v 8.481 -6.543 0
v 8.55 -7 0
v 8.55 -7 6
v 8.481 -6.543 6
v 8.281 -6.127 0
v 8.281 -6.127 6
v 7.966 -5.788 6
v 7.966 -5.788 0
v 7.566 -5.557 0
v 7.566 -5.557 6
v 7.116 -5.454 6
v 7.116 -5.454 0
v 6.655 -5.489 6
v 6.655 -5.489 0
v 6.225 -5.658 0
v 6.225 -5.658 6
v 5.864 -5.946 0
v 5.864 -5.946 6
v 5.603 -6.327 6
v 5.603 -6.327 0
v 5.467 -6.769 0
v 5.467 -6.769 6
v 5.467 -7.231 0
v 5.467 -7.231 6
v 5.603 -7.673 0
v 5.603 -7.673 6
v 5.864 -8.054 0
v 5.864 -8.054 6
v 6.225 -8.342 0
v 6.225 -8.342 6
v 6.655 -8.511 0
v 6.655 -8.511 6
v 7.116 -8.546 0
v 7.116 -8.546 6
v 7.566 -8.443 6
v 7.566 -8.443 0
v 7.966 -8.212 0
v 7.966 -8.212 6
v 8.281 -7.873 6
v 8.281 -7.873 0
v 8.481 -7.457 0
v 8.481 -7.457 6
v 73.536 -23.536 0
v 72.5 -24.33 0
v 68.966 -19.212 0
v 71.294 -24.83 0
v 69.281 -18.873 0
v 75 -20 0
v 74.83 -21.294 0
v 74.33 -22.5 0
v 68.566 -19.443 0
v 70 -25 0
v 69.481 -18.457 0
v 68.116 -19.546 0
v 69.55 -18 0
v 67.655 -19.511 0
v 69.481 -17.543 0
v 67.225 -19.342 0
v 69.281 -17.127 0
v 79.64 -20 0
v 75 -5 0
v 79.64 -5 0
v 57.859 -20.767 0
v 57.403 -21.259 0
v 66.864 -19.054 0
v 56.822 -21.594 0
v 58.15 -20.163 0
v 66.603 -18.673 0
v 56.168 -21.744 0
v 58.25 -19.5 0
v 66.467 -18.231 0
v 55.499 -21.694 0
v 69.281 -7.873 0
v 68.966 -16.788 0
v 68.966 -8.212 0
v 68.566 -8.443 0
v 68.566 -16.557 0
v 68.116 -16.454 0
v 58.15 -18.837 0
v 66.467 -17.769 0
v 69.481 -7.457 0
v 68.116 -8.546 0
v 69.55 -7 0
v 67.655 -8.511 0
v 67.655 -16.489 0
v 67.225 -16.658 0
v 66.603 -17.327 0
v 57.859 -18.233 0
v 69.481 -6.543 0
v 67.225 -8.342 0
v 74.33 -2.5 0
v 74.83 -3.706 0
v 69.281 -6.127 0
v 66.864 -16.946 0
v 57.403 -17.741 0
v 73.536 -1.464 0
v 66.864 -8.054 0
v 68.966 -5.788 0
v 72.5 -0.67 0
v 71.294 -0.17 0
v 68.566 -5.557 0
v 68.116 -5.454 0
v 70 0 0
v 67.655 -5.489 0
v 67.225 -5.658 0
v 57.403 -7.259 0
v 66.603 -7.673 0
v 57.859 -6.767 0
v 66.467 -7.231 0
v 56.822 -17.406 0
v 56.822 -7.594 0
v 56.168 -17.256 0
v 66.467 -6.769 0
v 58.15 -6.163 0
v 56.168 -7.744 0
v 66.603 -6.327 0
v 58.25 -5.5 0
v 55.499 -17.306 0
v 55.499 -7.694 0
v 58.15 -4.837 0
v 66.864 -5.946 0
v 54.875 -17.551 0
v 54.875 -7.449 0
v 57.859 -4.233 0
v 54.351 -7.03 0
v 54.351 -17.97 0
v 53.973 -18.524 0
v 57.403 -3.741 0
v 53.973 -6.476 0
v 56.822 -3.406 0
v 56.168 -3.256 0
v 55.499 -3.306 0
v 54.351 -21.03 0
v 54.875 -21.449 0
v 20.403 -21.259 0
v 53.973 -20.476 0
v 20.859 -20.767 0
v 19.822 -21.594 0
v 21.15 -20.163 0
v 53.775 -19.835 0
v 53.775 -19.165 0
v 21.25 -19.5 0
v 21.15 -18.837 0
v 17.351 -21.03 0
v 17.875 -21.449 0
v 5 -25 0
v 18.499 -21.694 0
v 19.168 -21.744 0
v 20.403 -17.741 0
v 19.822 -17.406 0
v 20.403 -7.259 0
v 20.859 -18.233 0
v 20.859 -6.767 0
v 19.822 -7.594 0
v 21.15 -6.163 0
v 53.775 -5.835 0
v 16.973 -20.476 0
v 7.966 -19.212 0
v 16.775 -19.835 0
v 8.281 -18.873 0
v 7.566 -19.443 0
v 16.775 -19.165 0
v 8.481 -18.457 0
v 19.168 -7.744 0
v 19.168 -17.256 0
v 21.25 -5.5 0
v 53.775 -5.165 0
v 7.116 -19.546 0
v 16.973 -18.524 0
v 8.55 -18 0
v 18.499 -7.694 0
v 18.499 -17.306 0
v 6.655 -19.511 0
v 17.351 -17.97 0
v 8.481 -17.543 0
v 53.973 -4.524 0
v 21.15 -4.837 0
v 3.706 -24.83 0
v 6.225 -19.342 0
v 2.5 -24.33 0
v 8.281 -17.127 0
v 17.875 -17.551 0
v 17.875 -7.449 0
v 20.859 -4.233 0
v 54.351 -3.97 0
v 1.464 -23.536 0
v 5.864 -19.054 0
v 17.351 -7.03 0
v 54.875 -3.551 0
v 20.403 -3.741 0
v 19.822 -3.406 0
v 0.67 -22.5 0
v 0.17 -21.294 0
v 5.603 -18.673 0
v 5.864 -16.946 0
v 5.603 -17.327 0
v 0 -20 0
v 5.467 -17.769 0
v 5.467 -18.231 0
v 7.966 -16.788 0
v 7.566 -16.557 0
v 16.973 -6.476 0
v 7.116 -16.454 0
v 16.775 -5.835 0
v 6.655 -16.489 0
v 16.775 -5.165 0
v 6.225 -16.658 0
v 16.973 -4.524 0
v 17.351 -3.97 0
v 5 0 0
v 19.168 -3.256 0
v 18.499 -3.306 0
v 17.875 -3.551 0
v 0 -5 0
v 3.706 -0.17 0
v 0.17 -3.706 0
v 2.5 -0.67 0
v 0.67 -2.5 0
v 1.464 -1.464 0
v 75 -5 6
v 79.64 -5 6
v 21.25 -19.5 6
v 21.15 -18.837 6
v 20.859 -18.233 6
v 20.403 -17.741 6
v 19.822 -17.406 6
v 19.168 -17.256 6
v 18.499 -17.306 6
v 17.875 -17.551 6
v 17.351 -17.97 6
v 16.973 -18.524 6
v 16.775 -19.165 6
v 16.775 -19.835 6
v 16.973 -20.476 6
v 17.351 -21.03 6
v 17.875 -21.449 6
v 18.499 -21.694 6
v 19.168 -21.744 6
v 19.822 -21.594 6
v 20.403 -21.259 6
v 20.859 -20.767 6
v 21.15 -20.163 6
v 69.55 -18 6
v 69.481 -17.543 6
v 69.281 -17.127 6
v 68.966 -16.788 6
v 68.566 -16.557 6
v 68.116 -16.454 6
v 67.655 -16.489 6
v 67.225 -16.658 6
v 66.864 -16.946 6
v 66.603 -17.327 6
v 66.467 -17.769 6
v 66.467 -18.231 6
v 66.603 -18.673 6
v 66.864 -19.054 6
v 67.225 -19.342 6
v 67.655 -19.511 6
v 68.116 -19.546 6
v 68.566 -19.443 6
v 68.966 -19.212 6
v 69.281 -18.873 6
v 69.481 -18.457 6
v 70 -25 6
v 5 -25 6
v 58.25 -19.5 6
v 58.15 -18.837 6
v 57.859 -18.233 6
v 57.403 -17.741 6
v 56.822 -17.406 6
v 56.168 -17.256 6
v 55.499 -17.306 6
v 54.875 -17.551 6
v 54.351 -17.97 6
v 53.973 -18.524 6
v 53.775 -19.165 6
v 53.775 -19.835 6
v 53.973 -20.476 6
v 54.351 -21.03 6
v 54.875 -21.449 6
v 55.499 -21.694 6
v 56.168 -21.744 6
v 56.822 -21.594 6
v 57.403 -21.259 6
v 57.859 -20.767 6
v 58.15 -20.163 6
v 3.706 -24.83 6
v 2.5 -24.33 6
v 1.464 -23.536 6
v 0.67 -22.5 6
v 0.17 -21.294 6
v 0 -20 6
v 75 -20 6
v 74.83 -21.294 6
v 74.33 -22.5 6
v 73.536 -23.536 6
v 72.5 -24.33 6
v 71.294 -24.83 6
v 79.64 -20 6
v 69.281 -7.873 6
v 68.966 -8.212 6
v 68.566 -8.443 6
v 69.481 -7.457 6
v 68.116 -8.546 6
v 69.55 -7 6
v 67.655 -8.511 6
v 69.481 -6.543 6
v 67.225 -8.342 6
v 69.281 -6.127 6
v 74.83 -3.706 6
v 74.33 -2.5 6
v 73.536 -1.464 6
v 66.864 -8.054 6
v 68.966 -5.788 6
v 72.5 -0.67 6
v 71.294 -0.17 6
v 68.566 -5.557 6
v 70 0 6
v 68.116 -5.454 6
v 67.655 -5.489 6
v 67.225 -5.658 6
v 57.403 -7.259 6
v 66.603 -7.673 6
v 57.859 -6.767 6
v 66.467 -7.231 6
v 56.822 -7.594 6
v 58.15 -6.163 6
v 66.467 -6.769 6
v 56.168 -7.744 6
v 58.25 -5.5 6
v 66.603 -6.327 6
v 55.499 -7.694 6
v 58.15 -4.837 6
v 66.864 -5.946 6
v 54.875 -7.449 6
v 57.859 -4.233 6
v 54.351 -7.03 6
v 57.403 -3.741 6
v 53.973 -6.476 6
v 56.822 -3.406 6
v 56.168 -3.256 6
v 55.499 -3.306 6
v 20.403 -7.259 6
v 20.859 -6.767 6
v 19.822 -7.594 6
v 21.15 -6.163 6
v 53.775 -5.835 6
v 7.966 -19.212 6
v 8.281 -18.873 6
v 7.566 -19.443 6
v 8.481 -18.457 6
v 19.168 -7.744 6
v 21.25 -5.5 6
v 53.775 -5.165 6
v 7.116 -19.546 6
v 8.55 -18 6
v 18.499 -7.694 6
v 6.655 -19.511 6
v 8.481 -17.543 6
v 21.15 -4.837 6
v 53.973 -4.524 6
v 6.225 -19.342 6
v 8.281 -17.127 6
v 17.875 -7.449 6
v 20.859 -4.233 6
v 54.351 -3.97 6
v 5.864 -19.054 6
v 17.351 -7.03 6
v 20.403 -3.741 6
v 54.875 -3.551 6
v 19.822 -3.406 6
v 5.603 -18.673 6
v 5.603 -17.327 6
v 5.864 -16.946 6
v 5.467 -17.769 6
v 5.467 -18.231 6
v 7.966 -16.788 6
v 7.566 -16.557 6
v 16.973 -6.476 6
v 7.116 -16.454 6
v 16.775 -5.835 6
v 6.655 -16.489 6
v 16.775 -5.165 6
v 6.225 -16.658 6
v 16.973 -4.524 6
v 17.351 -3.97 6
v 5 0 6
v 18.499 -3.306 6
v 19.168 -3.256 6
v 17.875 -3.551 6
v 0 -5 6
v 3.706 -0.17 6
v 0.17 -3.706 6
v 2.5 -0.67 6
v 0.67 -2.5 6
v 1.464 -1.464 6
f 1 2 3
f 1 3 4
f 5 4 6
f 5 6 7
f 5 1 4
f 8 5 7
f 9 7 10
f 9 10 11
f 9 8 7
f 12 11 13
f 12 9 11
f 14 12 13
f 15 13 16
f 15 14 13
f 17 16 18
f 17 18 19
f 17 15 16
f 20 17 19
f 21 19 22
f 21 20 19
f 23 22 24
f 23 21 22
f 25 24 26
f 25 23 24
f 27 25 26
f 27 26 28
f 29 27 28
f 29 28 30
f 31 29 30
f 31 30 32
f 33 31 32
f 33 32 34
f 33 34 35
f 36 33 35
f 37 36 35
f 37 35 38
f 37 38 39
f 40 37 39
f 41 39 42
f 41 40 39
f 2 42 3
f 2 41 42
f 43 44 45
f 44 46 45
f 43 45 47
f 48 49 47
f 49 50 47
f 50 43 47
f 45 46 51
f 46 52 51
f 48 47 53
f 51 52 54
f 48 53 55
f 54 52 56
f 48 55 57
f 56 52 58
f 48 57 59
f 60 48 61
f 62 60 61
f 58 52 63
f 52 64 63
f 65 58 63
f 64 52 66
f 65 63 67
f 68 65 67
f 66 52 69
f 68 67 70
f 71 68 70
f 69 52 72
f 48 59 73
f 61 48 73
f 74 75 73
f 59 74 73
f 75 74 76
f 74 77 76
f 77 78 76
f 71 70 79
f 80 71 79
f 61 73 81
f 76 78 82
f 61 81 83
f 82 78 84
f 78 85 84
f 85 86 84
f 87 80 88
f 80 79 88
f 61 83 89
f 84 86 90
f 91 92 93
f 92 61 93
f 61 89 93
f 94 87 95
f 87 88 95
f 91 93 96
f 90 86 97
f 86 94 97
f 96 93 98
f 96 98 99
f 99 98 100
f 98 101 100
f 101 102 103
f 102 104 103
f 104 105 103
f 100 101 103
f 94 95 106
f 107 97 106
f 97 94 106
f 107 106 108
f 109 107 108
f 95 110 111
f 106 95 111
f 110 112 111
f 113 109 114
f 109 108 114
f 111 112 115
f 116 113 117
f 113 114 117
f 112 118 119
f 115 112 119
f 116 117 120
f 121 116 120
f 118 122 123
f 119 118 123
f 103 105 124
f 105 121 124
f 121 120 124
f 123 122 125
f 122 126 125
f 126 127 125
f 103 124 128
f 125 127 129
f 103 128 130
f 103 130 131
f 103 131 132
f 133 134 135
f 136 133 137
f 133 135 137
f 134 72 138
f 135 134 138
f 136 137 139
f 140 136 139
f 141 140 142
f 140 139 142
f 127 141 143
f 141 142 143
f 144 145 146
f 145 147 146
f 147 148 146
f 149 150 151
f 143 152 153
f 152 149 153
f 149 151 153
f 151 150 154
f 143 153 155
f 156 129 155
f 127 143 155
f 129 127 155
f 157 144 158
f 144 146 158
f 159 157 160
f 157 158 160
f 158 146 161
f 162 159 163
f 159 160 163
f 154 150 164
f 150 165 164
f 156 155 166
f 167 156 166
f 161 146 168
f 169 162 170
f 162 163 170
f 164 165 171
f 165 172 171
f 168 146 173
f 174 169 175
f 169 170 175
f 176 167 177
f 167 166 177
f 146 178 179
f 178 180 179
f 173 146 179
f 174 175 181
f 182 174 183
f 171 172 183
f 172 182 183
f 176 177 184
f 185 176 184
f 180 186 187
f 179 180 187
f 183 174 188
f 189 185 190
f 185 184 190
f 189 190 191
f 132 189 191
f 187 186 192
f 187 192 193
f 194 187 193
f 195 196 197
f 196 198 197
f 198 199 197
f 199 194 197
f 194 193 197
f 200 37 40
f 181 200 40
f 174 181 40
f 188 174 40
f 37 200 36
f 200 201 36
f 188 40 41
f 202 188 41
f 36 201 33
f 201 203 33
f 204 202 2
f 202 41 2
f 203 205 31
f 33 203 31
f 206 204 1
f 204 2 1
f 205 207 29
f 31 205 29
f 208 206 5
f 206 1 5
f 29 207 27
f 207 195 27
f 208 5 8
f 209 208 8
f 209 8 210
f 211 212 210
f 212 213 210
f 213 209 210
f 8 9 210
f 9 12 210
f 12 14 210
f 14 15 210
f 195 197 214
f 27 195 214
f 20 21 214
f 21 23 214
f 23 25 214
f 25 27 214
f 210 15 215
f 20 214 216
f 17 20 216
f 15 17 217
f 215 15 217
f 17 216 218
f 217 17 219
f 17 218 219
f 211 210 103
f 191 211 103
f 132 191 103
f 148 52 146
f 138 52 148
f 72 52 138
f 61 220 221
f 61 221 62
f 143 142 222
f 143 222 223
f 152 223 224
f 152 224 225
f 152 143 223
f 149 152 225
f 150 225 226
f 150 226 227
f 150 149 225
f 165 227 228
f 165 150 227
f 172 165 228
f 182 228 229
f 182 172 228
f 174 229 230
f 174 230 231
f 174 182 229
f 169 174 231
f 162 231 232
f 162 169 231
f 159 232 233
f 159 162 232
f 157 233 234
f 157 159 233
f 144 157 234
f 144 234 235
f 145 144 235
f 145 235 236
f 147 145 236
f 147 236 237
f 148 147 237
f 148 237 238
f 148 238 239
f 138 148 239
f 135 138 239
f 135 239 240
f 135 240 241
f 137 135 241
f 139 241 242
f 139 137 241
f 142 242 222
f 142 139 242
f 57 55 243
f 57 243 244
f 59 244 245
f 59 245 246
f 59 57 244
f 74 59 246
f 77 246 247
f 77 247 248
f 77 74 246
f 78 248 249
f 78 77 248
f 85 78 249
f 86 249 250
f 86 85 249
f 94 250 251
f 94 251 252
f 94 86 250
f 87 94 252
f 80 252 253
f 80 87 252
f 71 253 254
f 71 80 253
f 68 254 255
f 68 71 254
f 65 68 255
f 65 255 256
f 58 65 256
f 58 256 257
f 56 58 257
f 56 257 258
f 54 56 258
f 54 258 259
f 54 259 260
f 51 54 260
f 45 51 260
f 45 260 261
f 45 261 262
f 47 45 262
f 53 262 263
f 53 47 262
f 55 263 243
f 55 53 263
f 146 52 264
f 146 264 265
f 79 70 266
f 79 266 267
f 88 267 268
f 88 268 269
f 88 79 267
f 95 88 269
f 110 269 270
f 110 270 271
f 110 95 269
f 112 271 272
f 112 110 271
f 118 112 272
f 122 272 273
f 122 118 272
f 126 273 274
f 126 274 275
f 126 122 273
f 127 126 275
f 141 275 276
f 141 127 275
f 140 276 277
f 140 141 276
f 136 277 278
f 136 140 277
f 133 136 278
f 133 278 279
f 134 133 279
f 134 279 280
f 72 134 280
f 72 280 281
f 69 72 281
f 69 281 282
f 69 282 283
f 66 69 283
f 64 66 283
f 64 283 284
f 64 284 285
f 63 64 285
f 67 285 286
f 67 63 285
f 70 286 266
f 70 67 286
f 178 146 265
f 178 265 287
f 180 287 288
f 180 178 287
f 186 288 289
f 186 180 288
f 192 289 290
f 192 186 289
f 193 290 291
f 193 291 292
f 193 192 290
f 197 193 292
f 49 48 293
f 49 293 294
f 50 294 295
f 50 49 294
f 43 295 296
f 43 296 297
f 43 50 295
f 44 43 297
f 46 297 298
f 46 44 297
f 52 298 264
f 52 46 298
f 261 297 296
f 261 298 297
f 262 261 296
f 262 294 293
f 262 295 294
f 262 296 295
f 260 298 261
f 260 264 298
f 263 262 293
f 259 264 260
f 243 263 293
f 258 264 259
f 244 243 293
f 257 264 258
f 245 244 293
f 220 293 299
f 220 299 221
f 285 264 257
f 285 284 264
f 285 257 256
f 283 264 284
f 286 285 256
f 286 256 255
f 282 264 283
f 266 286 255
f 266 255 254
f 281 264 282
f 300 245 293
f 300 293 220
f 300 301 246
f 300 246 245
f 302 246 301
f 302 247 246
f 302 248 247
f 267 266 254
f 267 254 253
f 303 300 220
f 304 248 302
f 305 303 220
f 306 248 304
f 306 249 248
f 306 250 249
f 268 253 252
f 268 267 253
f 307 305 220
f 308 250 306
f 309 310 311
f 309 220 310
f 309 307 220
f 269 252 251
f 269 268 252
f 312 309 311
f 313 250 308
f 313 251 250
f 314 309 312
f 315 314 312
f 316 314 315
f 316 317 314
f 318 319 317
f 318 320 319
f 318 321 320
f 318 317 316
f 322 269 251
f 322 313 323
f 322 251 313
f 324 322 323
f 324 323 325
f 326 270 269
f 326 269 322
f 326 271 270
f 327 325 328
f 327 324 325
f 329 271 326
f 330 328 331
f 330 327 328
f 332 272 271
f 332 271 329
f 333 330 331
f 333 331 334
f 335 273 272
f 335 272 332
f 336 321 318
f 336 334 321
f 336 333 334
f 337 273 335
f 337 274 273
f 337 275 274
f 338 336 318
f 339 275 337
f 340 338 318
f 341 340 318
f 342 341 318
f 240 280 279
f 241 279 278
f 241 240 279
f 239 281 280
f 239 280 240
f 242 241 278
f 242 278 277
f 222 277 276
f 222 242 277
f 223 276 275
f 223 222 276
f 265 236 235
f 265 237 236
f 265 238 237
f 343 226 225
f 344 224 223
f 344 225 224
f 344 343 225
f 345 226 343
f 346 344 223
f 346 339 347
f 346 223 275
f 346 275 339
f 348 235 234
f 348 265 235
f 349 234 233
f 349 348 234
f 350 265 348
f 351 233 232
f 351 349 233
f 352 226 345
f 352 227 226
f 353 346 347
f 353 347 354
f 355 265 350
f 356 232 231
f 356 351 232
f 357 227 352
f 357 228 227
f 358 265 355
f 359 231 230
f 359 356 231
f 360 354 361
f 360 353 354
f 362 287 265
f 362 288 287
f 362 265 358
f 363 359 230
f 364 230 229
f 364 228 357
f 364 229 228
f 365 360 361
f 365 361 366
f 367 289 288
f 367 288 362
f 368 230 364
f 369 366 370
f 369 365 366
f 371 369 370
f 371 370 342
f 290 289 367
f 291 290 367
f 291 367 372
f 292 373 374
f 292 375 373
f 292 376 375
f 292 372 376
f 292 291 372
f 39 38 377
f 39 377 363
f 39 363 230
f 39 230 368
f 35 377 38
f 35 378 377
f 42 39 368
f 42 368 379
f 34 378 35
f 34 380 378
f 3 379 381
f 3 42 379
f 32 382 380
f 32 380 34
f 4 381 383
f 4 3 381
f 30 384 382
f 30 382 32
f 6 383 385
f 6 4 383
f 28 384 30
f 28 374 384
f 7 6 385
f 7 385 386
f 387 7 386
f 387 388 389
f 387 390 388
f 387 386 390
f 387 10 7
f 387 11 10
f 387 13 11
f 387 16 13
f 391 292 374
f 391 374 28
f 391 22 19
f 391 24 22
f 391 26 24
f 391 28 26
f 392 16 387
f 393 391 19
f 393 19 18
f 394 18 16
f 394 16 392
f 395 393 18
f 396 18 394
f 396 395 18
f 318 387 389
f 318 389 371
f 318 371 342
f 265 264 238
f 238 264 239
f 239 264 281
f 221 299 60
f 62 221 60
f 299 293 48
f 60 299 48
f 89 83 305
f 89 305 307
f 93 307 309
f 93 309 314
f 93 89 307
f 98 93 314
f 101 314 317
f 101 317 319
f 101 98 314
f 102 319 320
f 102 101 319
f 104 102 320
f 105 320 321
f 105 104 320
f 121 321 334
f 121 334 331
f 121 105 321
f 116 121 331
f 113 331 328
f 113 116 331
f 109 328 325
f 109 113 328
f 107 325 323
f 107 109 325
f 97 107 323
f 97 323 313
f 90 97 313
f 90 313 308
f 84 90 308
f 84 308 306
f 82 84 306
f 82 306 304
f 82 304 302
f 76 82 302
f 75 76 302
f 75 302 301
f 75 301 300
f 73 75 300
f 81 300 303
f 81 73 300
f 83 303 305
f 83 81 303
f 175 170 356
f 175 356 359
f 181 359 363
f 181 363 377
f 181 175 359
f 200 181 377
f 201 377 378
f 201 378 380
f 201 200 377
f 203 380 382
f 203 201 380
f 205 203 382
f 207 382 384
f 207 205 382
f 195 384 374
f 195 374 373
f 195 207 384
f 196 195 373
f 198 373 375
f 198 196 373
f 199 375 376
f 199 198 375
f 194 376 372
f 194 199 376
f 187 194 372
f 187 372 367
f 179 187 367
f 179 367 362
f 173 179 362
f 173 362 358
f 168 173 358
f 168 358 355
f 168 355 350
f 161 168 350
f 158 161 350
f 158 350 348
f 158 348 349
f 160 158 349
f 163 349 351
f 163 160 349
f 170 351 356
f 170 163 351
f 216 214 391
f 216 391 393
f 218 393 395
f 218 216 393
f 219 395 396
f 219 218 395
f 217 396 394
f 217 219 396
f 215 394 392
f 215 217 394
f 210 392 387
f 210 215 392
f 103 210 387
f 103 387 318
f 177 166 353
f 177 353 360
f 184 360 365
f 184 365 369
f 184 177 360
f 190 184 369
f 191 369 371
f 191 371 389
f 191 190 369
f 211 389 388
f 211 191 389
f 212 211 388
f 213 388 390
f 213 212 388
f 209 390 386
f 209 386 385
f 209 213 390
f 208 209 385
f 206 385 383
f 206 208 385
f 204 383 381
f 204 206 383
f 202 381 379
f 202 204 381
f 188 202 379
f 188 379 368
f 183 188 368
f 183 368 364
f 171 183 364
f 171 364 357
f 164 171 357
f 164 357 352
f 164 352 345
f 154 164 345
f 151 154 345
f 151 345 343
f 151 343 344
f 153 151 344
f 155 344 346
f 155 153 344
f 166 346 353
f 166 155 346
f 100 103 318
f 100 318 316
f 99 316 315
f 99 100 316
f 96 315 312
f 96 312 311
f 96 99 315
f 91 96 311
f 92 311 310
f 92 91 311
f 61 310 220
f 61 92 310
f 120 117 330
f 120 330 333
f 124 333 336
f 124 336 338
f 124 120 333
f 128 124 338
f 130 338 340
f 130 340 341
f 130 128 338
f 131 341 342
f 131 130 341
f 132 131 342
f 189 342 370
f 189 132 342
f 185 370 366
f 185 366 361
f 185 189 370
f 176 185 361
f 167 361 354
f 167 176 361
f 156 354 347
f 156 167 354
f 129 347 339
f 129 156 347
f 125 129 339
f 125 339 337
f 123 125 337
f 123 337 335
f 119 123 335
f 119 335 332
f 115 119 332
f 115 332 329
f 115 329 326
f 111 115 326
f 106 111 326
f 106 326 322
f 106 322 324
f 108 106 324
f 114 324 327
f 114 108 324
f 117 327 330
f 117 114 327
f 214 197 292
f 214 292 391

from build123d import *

# Parameters (mm, degrees)
SKETCH1_R           = 1.55
SKETCH1_R_2         = 2.25
BOSS_EXTRUDE1_DEPTH = 6
SKETCH4_W           = 6
SKETCH4_H           = 15
BOSS_EXTRUDE3_DEPTH = 4.64


with BuildPart() as part:
    # Sketch1 → Boss-Extrude1 (new body)
    with BuildSketch(Plane.XY):
        with BuildLine():
            Line((5, 0), (70, 0))
            ThreePointArc((70, 0), (73.535533906, -1.464466094), (75, -5))
            Line((75, -5), (75, -20))
            ThreePointArc((75, -20), (73.535533906, -23.535533906), (70, -25))
            Line((70, -25), (5, -25))
            ThreePointArc((5, -25), (1.464466094, -23.535533906), (0, -20))
            Line((0, -20), (0, -5))
            ThreePointArc((0, -5), (1.464466094, -1.464466094), (5, 0))
        make_face()
        with Locations((7, -7)):
            Circle(SKETCH1_R, mode=Mode.SUBTRACT)
        with Locations((7, -18)):
            Circle(SKETCH1_R, mode=Mode.SUBTRACT)
        with Locations((68, -7)):
            Circle(SKETCH1_R, mode=Mode.SUBTRACT)
        with Locations((68, -18)):
            Circle(SKETCH1_R, mode=Mode.SUBTRACT)
        with Locations((19, -5.5)):
            Circle(SKETCH1_R_2, mode=Mode.SUBTRACT)
        with Locations((19, -19.5)):
            Circle(SKETCH1_R_2, mode=Mode.SUBTRACT)
        with Locations((56, -5.5)):
            Circle(SKETCH1_R_2, mode=Mode.SUBTRACT)
        with Locations((56, -19.5)):
            Circle(SKETCH1_R_2, mode=Mode.SUBTRACT)
    extrude(amount=BOSS_EXTRUDE1_DEPTH)

    # Sketch4 → Boss-Extrude3 (add)
    with BuildSketch(Plane(origin=(75, 0, 0), x_dir=(0, 0, -1), z_dir=(1, 0, 0))):
        with Locations((-3, -12.5)):
            Rectangle(SKETCH4_W, SKETCH4_H)
    extrude(amount=BOSS_EXTRUDE3_DEPTH)


solid = part.part
